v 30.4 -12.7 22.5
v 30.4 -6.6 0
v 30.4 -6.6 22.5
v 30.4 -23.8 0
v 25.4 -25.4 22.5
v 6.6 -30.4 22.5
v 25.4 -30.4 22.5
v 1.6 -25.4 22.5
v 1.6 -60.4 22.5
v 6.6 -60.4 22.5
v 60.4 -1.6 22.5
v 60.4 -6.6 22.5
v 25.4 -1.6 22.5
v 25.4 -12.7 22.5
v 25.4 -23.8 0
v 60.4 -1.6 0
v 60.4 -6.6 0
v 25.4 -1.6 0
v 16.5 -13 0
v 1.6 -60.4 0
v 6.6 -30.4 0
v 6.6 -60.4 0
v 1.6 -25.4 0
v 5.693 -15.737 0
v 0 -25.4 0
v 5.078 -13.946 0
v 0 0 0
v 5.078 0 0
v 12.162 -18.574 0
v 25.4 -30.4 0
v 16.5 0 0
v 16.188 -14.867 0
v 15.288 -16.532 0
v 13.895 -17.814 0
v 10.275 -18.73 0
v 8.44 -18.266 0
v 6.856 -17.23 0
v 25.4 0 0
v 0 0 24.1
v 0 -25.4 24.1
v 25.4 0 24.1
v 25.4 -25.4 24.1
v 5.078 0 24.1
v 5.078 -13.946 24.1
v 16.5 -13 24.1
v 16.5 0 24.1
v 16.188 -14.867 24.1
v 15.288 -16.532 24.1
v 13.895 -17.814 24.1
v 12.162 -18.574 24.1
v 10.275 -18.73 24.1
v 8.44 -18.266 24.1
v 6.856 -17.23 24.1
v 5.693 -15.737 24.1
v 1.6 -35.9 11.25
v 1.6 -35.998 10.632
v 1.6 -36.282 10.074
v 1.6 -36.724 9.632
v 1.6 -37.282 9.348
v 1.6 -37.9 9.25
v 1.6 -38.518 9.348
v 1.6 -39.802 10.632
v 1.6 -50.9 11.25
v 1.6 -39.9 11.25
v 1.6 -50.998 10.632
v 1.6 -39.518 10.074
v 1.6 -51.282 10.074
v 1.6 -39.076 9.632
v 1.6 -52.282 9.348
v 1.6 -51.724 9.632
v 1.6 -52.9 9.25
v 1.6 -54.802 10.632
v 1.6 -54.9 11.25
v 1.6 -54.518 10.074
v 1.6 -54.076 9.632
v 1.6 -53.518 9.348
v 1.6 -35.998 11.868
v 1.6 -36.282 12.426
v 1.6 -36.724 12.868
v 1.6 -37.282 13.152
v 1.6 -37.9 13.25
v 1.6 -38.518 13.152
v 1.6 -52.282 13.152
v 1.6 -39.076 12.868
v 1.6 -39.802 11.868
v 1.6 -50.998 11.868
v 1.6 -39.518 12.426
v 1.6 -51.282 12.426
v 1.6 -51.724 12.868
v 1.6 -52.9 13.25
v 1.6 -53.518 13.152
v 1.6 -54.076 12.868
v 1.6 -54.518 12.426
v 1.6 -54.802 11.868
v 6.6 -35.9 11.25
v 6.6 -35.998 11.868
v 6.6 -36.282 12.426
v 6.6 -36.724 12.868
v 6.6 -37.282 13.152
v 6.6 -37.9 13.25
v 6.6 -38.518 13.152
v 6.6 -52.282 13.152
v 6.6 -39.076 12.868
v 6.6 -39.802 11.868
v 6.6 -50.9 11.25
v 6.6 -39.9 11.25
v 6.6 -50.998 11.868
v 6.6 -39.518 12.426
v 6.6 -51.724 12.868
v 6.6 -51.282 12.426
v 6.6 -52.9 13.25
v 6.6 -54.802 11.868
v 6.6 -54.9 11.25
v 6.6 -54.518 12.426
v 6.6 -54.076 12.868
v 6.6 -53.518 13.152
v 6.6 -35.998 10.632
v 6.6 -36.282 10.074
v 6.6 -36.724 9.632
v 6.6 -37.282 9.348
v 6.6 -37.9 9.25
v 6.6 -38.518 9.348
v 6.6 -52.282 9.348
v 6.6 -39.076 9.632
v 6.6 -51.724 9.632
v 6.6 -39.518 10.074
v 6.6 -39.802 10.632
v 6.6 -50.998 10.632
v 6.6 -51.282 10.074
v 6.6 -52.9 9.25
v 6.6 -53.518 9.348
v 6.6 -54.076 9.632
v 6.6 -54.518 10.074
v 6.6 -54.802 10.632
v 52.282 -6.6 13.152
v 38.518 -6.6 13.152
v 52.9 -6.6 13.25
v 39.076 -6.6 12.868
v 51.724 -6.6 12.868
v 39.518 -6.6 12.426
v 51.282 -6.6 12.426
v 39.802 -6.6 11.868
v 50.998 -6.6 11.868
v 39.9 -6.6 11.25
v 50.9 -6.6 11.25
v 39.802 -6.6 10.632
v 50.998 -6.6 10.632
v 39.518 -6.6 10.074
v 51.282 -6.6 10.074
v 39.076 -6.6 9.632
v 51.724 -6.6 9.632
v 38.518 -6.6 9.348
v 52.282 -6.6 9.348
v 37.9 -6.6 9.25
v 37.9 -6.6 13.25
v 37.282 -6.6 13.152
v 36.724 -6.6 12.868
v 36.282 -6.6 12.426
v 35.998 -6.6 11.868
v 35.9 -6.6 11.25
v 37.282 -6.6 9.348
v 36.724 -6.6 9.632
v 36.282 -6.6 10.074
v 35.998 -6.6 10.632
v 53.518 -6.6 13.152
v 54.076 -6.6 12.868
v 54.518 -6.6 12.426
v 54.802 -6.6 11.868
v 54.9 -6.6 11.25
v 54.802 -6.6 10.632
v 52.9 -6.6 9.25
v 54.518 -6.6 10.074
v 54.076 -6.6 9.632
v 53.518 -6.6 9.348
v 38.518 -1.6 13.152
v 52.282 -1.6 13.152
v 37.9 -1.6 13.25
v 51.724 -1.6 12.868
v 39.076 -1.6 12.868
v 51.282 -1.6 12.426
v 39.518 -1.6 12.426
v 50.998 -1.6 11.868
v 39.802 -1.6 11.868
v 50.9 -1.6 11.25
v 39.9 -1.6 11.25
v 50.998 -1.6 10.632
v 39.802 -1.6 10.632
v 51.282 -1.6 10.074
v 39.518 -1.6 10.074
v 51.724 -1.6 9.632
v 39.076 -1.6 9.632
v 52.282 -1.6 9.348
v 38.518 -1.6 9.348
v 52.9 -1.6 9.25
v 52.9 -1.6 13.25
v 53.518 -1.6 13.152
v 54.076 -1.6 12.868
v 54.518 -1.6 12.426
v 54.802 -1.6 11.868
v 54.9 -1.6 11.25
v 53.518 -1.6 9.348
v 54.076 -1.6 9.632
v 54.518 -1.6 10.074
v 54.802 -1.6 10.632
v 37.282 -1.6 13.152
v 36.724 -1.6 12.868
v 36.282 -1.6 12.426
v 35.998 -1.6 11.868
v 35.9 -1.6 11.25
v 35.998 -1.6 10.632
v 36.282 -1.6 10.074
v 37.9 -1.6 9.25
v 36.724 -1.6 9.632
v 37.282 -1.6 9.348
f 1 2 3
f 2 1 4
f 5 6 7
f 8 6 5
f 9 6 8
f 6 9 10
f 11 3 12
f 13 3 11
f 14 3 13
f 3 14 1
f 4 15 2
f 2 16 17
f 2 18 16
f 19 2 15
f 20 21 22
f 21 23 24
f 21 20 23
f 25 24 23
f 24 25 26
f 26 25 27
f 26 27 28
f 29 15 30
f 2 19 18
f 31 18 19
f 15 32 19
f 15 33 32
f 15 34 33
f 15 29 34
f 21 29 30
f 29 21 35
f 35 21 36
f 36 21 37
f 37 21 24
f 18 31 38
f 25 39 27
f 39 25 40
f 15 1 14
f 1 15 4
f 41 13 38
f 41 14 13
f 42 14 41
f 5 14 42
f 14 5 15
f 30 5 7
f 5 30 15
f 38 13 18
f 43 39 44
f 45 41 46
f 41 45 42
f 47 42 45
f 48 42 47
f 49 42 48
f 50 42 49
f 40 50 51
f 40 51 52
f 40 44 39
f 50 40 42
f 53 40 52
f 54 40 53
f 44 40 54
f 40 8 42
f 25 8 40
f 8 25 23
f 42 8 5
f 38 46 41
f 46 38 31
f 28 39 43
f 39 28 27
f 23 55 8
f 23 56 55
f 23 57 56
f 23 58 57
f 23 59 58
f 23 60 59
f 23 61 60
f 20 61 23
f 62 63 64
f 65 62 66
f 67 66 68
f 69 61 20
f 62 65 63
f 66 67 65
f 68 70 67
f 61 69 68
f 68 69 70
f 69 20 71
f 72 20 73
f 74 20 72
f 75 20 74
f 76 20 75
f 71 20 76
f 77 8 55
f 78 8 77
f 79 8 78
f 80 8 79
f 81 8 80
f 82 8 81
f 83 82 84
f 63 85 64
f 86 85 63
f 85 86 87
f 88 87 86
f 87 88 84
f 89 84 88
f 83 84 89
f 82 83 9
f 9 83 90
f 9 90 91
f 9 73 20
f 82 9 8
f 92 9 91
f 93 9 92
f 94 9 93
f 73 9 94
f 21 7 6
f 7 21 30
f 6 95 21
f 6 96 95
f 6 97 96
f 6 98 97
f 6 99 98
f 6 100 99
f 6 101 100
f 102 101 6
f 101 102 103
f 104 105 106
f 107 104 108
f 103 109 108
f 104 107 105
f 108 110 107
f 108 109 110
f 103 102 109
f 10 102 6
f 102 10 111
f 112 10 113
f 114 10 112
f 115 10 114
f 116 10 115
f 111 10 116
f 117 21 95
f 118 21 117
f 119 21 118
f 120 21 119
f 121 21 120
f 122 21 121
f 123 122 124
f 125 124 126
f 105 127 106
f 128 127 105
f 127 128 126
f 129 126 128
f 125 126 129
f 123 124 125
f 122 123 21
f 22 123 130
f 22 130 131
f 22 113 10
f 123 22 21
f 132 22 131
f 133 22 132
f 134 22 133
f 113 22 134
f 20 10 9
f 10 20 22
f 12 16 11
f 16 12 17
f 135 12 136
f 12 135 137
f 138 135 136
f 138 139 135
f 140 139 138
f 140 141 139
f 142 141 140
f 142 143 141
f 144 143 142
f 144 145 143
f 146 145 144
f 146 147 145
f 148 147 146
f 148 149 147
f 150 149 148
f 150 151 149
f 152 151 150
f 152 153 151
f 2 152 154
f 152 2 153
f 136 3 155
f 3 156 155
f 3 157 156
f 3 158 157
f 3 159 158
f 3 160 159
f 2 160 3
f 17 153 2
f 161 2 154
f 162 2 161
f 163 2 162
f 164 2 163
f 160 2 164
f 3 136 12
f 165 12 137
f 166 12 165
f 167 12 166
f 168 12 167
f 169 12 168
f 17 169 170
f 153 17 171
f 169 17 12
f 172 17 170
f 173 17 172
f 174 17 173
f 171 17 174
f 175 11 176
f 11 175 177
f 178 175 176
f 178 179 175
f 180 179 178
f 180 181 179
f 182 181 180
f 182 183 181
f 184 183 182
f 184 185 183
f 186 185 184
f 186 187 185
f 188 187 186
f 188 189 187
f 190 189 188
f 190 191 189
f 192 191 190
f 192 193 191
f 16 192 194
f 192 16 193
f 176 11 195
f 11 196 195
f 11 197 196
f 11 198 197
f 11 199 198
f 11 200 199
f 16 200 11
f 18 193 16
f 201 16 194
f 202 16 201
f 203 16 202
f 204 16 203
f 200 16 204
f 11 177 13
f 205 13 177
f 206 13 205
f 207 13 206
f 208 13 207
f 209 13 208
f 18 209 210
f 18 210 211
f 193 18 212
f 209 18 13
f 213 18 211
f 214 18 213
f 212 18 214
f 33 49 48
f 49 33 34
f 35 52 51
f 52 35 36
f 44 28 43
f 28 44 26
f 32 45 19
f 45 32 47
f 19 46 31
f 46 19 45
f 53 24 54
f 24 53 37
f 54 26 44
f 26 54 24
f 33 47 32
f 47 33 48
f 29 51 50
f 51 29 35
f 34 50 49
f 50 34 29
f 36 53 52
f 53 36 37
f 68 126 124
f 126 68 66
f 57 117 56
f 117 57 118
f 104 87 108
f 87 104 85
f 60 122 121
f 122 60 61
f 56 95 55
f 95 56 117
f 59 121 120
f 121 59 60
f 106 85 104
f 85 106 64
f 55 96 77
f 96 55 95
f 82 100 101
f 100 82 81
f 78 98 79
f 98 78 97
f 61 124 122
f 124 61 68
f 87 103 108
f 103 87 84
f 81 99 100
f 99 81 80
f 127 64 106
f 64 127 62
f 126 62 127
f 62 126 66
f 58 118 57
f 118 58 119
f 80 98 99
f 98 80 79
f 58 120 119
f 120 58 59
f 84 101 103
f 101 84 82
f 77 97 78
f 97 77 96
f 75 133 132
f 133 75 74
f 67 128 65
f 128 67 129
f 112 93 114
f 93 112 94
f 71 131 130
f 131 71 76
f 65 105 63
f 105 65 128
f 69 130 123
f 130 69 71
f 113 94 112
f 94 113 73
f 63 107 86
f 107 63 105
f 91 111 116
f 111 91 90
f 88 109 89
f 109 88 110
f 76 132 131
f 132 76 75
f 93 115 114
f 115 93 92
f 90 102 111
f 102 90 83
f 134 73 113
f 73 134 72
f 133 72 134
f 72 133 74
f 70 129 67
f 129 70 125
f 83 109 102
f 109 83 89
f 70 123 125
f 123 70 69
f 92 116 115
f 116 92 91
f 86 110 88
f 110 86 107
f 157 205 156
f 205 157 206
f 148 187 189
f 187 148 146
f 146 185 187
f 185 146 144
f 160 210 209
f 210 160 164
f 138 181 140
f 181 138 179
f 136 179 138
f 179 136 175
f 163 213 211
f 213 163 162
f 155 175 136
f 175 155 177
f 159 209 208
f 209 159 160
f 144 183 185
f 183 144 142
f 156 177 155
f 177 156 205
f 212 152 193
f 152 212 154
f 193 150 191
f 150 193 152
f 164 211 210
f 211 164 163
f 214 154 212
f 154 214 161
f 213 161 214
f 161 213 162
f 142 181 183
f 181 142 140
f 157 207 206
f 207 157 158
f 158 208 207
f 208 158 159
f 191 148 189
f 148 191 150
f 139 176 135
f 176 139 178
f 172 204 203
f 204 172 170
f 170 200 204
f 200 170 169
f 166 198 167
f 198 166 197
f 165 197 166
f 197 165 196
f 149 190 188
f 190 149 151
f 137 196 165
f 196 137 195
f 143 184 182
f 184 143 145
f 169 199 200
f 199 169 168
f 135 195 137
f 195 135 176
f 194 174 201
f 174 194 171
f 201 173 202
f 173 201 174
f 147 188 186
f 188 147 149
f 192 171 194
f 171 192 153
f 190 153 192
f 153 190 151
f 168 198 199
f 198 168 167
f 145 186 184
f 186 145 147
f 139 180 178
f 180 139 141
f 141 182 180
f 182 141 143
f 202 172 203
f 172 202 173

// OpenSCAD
channelHeight = 25.7;
channelWall = 1.6;
channelBottom = 25.4;
channelTop = 12.7;

plugDepth = 5;
armLength = 30;
armThickness = 5;
cutoutDiameter = 11.5;
cutoutX = 5+cutoutDiameter/2;
cutoutY = 13;
rivet = 4;

delta = 1;

mirror([0,1,0])
difference()
{
    union()
    {
        cube([channelBottom, channelBottom, channelHeight-channelWall]);
        translate([channelWall,0,0])
          cube([channelBottom-channelWall, channelBottom+plugDepth, channelHeight-channelWall*2]);
        translate([0,channelWall,0])
        {
          cube([channelBottom+plugDepth, channelTop-channelWall, channelHeight-channelWall*2]);
          translate([0,channelTop-channelWall,0])
          rotate([0,-90,-90])
            prism(channelBottom+plugDepth, channelHeight-channelWall*2, channelTop-channelWall);
        }
        translate([channelWall,0,0])
          cube([armThickness, channelBottom+plugDepth+armLength, channelHeight-channelWall*2]);
        translate([0,channelWall,0])
          cube([channelBottom+plugDepth+armLength, armThickness, channelHeight-channelWall*2]);
    }
    translate([0,0,-delta/2])
      hull()
      {
        translate([cutoutX, cutoutY, 0])
          cylinder(h=channelHeight+delta, d=cutoutDiameter);
        translate([cutoutX, -cutoutY, 0])
          cylinder(h=channelHeight+delta, d=cutoutDiameter);
      }
    translate([0,channelBottom+plugDepth+armLength/4,(channelHeight-channelWall*2)/2])
      rotate([0,90,0]) cylinder(h=channelWall+armThickness+delta, d=rivet, $fn=20);
    translate([0,channelBottom+plugDepth+3*armLength/4,(channelHeight-channelWall*2)/2])
      rotate([0,90,0]) cylinder(h=channelWall+armThickness+delta, d=rivet, $fn=20);

    translate([channelBottom+plugDepth+armLength/4,0,(channelHeight-channelWall*2)/2])
      rotate([-90,0,0]) cylinder(h=channelWall+armThickness+delta, d=rivet, $fn=20);
    translate([channelBottom+plugDepth+3*armLength/4,0,(channelHeight-channelWall*2)/2])
      rotate([-90,0,0]) cylinder(h=channelWall+armThickness+delta, d=rivet, $fn=20);
}

//Draw a prism based on a 
//right angled triangle
//l - length of prism
//w - width of triangle
//h - height of triangle
module prism(l, w, h) {
       polyhedron(points=[
               [0,0,h],           // 0    front top corner
               [0,0,0],[w,0,0],   // 1, 2 front left & right bottom corners
               [0,l,h],           // 3    back top corner
               [0,l,0],[w,l,0]    // 4, 5 back left & right bottom corners
       ], faces=[ // points for all faces must be ordered clockwise when looking in
               [0,2,1],    // top face
               [3,4,5],    // base face
               [0,1,4,3],  // h face
               [1,2,5,4],  // w face
               [0,3,5,2],  // hypotenuse face
       ]);
}
